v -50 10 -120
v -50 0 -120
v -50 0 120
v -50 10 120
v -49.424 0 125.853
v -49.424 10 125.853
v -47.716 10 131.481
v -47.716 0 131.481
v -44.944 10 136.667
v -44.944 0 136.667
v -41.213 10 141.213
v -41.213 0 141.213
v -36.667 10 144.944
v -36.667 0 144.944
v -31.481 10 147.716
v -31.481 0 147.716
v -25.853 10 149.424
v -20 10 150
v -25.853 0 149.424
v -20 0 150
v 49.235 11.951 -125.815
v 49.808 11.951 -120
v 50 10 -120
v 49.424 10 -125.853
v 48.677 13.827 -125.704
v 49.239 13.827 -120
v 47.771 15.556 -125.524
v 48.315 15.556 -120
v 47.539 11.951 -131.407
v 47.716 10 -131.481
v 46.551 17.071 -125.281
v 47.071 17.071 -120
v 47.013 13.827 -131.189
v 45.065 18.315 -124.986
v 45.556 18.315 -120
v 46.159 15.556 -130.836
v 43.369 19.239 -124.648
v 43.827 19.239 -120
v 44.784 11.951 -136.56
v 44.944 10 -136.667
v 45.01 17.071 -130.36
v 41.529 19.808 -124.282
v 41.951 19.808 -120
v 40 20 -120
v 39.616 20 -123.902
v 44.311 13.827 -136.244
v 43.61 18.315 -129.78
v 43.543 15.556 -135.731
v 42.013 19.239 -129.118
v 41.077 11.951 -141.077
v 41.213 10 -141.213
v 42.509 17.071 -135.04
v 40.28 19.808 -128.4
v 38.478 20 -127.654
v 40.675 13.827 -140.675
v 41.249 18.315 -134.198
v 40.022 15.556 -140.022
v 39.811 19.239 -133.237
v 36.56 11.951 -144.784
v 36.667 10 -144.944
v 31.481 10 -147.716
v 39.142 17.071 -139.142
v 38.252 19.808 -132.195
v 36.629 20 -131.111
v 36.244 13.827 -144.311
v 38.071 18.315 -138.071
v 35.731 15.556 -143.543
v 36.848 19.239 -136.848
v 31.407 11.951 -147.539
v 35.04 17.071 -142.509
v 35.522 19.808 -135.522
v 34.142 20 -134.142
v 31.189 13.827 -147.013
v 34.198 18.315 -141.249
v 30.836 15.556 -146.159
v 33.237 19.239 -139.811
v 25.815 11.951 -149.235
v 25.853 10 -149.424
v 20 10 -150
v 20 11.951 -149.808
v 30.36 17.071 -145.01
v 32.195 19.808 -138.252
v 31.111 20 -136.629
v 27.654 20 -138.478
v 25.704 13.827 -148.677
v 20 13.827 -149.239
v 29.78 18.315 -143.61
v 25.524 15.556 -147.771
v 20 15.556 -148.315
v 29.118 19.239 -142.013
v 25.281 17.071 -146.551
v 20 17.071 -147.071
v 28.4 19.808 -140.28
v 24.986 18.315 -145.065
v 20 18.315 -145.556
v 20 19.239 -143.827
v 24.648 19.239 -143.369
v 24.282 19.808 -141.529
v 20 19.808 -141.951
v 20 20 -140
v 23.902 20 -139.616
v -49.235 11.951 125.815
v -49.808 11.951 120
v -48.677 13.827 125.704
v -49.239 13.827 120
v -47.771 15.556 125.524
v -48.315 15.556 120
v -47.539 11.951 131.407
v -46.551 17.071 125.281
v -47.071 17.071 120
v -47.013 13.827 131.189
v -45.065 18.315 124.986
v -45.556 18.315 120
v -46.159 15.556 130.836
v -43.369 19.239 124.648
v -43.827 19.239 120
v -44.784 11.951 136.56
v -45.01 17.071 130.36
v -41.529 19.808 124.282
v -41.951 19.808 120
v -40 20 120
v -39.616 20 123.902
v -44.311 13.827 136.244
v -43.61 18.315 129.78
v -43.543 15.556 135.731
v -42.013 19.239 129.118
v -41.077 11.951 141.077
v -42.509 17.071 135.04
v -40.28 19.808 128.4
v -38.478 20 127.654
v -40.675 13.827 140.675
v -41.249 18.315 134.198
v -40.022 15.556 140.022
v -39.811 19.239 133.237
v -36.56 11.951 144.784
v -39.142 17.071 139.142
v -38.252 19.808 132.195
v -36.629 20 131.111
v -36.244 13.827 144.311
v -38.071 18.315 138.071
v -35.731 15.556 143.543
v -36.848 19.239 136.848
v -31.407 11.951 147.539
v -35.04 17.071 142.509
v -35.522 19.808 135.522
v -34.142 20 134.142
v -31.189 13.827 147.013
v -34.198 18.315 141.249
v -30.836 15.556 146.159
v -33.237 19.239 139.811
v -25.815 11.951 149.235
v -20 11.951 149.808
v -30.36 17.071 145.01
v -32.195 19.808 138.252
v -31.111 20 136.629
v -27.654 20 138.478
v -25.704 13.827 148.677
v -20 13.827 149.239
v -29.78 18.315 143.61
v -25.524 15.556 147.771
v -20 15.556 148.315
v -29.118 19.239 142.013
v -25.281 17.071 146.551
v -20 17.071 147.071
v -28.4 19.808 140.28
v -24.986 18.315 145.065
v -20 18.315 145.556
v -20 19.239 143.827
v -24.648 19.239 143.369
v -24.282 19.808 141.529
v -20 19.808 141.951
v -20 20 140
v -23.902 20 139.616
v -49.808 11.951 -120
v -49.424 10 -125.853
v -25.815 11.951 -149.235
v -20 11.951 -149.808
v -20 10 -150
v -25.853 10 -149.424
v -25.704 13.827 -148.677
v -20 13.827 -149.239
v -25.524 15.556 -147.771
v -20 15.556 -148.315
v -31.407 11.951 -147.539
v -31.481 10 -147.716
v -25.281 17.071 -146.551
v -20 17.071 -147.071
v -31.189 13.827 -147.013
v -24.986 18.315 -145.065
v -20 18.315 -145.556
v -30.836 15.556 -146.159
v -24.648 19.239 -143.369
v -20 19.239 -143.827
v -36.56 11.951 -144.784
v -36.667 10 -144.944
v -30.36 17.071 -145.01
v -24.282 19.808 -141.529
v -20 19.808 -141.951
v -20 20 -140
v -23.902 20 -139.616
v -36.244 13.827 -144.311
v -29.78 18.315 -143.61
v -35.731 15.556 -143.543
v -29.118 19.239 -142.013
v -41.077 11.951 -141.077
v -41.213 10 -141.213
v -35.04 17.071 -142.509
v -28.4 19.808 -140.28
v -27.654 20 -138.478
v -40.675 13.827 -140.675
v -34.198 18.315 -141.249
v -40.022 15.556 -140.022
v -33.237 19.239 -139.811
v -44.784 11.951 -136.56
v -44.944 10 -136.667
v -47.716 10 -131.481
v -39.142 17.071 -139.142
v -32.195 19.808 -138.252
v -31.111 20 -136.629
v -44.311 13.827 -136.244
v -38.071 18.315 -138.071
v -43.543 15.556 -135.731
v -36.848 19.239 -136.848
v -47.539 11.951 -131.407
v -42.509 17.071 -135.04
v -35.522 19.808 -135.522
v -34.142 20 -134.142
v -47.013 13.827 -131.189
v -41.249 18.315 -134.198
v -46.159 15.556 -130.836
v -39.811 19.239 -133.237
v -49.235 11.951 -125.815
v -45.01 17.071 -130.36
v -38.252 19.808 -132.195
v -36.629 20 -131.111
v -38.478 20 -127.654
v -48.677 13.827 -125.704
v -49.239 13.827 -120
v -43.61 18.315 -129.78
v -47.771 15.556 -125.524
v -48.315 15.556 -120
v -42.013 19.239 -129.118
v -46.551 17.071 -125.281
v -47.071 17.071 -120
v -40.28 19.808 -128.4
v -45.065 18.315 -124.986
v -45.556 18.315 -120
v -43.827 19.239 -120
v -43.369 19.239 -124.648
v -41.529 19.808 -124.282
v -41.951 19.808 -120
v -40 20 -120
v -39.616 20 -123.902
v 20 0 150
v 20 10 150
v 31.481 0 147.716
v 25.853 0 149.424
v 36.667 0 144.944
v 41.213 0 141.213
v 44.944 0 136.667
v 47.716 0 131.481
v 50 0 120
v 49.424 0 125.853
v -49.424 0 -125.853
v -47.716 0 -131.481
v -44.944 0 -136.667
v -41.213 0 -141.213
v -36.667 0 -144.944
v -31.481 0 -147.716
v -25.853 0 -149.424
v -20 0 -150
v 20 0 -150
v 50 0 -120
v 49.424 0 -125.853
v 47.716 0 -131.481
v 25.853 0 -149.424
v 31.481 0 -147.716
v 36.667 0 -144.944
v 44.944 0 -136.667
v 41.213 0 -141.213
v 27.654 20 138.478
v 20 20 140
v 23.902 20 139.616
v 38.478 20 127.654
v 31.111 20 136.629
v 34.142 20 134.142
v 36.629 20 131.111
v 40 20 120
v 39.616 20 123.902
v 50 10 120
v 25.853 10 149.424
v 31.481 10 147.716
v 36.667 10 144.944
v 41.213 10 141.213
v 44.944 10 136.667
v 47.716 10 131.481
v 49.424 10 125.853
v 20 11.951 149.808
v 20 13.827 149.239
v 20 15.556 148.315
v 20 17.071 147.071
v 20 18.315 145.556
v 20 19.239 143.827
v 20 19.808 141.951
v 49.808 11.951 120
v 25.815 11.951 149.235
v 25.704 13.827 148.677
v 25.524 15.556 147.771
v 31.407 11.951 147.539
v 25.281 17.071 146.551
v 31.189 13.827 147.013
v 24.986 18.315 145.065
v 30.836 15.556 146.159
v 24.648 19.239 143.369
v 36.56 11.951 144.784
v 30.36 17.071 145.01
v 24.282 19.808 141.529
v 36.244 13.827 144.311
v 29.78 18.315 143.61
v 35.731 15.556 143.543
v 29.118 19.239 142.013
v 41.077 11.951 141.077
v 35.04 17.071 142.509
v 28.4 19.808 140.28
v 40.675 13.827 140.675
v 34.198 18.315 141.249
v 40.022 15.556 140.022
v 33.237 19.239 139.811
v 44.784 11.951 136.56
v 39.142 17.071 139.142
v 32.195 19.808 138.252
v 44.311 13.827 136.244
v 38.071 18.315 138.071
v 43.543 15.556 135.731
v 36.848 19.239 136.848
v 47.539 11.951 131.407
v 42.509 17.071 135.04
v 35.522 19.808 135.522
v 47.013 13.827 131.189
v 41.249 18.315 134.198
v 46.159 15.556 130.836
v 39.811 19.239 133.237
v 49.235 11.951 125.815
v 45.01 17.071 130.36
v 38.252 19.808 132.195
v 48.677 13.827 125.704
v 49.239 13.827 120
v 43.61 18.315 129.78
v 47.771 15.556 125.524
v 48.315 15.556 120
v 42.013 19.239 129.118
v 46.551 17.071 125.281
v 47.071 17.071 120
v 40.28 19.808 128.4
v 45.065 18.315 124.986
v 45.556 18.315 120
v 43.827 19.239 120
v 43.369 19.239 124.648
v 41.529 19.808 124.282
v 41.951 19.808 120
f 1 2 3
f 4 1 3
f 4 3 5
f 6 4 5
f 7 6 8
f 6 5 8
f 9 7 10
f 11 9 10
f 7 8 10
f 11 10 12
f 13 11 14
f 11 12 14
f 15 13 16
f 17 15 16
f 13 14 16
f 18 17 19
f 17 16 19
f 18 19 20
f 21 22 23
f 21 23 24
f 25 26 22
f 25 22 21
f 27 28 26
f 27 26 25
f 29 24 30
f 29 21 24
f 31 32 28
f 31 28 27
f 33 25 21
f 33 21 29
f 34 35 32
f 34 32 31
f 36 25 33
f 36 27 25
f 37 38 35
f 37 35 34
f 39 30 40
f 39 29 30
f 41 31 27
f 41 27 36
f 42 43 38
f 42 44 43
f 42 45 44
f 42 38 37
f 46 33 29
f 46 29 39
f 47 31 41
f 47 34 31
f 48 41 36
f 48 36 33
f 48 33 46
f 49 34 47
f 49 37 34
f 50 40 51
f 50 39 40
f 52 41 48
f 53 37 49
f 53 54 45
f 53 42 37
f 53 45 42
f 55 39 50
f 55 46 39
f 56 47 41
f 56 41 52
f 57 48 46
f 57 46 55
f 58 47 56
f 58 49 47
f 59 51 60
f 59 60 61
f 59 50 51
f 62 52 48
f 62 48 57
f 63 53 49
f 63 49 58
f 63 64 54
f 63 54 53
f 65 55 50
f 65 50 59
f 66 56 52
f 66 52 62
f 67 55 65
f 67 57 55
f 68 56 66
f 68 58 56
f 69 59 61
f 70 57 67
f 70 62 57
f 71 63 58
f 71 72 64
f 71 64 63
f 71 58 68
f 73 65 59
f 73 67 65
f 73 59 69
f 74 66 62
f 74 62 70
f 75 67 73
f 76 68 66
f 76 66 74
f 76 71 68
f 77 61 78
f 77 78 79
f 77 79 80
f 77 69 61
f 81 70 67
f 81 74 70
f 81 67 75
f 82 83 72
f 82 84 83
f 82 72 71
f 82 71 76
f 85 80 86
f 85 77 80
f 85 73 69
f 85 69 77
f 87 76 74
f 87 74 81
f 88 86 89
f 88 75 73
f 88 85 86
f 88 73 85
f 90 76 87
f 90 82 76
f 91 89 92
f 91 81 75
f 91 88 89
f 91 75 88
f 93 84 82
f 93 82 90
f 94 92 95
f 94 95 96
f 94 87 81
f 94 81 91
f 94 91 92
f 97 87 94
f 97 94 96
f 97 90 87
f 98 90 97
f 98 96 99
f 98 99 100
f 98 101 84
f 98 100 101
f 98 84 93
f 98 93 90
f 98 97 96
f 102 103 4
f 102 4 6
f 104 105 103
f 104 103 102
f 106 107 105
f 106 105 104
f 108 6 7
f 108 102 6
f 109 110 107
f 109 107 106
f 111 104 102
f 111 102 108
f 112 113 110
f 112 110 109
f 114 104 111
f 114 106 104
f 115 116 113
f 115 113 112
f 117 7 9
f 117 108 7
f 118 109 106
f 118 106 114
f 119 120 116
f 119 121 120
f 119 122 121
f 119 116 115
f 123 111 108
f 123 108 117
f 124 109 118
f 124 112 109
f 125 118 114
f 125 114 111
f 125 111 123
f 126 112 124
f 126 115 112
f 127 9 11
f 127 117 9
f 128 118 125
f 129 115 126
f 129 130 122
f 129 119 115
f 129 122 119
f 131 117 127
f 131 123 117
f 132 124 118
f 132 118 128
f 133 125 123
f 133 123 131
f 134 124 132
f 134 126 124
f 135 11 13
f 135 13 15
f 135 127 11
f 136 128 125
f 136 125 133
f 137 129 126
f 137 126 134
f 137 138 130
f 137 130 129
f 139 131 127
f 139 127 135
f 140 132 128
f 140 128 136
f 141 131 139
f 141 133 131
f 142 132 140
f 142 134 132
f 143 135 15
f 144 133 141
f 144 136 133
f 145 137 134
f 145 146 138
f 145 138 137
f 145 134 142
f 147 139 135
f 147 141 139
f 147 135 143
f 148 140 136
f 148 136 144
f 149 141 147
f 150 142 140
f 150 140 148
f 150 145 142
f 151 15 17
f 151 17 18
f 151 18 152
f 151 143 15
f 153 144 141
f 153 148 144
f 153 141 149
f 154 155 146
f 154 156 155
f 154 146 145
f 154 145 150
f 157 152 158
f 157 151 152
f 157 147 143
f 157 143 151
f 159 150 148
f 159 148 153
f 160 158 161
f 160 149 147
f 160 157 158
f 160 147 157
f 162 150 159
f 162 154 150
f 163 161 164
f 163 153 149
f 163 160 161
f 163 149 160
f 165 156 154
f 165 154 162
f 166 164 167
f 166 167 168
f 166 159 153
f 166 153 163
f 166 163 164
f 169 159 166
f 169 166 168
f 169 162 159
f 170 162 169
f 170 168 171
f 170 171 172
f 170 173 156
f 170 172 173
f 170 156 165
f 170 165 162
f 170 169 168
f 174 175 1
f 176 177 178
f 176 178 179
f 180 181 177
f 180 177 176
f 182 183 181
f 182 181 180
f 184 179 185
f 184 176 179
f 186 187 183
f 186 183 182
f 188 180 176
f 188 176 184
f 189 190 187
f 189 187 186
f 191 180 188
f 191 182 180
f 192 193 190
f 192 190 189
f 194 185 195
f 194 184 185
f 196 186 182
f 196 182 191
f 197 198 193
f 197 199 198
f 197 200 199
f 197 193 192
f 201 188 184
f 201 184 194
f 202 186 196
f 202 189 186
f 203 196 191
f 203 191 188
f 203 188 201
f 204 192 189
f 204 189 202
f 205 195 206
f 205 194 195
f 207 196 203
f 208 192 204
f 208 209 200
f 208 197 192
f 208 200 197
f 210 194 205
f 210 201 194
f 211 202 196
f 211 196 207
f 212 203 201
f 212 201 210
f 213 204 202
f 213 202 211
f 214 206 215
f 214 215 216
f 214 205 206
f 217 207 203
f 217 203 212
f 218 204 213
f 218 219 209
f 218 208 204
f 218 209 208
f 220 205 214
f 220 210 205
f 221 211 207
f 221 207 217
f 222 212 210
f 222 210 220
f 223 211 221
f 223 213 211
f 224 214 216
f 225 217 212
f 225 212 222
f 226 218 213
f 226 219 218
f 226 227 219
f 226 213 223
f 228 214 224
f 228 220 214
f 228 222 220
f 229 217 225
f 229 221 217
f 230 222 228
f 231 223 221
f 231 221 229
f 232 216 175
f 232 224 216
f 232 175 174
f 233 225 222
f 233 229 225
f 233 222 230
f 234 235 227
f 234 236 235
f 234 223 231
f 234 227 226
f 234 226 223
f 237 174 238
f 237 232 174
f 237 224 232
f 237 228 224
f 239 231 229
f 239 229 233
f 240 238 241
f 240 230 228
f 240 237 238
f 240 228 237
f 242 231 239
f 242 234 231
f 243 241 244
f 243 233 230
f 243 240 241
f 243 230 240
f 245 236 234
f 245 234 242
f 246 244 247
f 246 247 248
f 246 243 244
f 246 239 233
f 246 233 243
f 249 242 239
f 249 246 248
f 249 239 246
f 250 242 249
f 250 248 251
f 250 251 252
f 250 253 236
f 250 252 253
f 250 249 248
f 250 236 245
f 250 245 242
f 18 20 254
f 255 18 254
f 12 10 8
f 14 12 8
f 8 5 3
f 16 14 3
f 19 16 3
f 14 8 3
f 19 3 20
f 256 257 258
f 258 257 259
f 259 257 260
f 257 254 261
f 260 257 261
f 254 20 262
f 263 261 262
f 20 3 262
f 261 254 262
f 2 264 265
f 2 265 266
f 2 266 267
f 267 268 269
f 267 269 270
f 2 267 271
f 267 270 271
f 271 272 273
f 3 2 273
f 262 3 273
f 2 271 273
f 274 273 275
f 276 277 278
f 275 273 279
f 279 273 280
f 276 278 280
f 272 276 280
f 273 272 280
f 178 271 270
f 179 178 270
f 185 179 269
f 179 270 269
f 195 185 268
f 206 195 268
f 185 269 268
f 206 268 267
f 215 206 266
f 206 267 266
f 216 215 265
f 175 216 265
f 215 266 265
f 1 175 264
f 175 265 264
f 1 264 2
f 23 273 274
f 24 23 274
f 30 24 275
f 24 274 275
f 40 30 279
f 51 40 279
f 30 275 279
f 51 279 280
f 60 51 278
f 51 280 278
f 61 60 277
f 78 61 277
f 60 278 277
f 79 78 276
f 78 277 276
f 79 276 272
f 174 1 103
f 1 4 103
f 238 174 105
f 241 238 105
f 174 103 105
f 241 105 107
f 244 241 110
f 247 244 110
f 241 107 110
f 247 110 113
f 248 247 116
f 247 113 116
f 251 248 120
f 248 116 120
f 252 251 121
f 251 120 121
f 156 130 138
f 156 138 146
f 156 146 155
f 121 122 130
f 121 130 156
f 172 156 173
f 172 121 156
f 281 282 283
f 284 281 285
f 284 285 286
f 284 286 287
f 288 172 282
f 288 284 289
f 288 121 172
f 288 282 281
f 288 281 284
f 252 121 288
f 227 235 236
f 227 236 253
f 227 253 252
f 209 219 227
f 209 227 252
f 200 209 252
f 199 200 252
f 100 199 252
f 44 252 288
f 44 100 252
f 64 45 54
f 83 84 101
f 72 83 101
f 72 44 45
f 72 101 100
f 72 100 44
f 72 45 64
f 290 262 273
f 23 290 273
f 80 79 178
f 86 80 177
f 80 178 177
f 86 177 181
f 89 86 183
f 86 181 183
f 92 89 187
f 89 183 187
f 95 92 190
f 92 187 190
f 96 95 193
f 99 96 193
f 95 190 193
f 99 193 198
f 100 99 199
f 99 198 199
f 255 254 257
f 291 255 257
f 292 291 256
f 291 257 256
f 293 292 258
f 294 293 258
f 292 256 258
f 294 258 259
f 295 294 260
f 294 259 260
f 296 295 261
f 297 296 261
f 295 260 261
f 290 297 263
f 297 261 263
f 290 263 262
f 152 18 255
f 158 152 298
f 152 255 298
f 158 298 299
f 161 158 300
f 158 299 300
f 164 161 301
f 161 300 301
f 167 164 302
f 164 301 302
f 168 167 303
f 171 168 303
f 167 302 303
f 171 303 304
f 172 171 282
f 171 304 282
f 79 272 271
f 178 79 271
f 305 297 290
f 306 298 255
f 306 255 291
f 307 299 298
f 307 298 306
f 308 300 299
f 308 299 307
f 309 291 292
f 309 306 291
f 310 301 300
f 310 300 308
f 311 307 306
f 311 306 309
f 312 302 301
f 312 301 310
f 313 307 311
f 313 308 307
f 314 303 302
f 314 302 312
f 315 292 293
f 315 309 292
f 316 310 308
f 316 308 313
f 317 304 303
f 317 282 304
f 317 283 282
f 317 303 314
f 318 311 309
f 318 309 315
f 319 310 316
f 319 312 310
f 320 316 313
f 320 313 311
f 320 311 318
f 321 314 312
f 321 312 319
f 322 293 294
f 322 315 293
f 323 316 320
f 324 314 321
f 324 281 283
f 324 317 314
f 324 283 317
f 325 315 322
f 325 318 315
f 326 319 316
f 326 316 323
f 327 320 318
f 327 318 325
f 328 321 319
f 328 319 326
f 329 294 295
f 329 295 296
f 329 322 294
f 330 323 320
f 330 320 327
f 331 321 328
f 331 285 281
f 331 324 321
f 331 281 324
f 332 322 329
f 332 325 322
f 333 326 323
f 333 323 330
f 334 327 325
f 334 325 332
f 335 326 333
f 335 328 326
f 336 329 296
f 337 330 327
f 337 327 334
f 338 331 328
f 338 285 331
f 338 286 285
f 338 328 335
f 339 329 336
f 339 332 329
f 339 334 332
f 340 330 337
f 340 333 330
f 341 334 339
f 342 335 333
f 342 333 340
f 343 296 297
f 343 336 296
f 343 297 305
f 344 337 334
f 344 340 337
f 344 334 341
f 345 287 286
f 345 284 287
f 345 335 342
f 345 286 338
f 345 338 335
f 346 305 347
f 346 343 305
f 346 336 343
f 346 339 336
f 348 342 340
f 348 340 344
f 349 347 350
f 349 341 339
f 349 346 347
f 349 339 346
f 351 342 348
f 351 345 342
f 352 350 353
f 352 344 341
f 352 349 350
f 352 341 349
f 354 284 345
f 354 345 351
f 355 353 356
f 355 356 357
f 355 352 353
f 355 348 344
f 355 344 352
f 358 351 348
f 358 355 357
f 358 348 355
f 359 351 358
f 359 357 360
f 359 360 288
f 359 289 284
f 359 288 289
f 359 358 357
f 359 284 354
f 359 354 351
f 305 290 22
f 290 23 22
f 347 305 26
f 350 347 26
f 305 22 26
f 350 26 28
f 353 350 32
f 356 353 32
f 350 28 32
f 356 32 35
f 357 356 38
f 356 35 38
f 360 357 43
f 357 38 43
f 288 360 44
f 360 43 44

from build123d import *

# Parameters (mm, degrees)
BOSS_EXTRUDE1_DEPTH = 20
FILLET1_R           = 10


with BuildPart() as part:
    # Sketch1 → Boss-Extrude1 (new body)
    with BuildSketch(Plane(origin=(0, 0, 0), x_dir=(1, 0, 0), z_dir=(0, 1, 0))):
        with BuildLine():
            Line((-20, -150), (20, -150))
            ThreePointArc((20, -150), (41.213203436, -141.213203436), (50, -120))
            Line((50, -120), (50, 120))
            ThreePointArc((50, 120), (41.213203436, 141.213203436), (20, 150))
            Line((20, 150), (-20, 150))
            ThreePointArc((-20, 150), (-41.213203436, 141.213203436), (-50, 120))
            Line((-50, 120), (-50, -120))
            ThreePointArc((-50, -120), (-41.213203436, -141.213203436), (-20, -150))
        make_face()
    extrude(amount=BOSS_EXTRUDE1_DEPTH)

    # Fillet1
    fillet1_edges = [part.edges().sort_by_distance(p)[0] for p in [
        (-41.213203436, 20, 141.213203436),
        (0, 20, 150),
        (41.213203436, 20, 141.213203436),
        (50, 20, 0),
        (41.213203436, 20, -141.213203436),
        (0, 20, -150),
        (-41.213203436, 20, -141.213203436),
        (-50, 20, 0),
    ]]
    fillet(fillet1_edges, radius=FILLET1_R)


solid = part.part
